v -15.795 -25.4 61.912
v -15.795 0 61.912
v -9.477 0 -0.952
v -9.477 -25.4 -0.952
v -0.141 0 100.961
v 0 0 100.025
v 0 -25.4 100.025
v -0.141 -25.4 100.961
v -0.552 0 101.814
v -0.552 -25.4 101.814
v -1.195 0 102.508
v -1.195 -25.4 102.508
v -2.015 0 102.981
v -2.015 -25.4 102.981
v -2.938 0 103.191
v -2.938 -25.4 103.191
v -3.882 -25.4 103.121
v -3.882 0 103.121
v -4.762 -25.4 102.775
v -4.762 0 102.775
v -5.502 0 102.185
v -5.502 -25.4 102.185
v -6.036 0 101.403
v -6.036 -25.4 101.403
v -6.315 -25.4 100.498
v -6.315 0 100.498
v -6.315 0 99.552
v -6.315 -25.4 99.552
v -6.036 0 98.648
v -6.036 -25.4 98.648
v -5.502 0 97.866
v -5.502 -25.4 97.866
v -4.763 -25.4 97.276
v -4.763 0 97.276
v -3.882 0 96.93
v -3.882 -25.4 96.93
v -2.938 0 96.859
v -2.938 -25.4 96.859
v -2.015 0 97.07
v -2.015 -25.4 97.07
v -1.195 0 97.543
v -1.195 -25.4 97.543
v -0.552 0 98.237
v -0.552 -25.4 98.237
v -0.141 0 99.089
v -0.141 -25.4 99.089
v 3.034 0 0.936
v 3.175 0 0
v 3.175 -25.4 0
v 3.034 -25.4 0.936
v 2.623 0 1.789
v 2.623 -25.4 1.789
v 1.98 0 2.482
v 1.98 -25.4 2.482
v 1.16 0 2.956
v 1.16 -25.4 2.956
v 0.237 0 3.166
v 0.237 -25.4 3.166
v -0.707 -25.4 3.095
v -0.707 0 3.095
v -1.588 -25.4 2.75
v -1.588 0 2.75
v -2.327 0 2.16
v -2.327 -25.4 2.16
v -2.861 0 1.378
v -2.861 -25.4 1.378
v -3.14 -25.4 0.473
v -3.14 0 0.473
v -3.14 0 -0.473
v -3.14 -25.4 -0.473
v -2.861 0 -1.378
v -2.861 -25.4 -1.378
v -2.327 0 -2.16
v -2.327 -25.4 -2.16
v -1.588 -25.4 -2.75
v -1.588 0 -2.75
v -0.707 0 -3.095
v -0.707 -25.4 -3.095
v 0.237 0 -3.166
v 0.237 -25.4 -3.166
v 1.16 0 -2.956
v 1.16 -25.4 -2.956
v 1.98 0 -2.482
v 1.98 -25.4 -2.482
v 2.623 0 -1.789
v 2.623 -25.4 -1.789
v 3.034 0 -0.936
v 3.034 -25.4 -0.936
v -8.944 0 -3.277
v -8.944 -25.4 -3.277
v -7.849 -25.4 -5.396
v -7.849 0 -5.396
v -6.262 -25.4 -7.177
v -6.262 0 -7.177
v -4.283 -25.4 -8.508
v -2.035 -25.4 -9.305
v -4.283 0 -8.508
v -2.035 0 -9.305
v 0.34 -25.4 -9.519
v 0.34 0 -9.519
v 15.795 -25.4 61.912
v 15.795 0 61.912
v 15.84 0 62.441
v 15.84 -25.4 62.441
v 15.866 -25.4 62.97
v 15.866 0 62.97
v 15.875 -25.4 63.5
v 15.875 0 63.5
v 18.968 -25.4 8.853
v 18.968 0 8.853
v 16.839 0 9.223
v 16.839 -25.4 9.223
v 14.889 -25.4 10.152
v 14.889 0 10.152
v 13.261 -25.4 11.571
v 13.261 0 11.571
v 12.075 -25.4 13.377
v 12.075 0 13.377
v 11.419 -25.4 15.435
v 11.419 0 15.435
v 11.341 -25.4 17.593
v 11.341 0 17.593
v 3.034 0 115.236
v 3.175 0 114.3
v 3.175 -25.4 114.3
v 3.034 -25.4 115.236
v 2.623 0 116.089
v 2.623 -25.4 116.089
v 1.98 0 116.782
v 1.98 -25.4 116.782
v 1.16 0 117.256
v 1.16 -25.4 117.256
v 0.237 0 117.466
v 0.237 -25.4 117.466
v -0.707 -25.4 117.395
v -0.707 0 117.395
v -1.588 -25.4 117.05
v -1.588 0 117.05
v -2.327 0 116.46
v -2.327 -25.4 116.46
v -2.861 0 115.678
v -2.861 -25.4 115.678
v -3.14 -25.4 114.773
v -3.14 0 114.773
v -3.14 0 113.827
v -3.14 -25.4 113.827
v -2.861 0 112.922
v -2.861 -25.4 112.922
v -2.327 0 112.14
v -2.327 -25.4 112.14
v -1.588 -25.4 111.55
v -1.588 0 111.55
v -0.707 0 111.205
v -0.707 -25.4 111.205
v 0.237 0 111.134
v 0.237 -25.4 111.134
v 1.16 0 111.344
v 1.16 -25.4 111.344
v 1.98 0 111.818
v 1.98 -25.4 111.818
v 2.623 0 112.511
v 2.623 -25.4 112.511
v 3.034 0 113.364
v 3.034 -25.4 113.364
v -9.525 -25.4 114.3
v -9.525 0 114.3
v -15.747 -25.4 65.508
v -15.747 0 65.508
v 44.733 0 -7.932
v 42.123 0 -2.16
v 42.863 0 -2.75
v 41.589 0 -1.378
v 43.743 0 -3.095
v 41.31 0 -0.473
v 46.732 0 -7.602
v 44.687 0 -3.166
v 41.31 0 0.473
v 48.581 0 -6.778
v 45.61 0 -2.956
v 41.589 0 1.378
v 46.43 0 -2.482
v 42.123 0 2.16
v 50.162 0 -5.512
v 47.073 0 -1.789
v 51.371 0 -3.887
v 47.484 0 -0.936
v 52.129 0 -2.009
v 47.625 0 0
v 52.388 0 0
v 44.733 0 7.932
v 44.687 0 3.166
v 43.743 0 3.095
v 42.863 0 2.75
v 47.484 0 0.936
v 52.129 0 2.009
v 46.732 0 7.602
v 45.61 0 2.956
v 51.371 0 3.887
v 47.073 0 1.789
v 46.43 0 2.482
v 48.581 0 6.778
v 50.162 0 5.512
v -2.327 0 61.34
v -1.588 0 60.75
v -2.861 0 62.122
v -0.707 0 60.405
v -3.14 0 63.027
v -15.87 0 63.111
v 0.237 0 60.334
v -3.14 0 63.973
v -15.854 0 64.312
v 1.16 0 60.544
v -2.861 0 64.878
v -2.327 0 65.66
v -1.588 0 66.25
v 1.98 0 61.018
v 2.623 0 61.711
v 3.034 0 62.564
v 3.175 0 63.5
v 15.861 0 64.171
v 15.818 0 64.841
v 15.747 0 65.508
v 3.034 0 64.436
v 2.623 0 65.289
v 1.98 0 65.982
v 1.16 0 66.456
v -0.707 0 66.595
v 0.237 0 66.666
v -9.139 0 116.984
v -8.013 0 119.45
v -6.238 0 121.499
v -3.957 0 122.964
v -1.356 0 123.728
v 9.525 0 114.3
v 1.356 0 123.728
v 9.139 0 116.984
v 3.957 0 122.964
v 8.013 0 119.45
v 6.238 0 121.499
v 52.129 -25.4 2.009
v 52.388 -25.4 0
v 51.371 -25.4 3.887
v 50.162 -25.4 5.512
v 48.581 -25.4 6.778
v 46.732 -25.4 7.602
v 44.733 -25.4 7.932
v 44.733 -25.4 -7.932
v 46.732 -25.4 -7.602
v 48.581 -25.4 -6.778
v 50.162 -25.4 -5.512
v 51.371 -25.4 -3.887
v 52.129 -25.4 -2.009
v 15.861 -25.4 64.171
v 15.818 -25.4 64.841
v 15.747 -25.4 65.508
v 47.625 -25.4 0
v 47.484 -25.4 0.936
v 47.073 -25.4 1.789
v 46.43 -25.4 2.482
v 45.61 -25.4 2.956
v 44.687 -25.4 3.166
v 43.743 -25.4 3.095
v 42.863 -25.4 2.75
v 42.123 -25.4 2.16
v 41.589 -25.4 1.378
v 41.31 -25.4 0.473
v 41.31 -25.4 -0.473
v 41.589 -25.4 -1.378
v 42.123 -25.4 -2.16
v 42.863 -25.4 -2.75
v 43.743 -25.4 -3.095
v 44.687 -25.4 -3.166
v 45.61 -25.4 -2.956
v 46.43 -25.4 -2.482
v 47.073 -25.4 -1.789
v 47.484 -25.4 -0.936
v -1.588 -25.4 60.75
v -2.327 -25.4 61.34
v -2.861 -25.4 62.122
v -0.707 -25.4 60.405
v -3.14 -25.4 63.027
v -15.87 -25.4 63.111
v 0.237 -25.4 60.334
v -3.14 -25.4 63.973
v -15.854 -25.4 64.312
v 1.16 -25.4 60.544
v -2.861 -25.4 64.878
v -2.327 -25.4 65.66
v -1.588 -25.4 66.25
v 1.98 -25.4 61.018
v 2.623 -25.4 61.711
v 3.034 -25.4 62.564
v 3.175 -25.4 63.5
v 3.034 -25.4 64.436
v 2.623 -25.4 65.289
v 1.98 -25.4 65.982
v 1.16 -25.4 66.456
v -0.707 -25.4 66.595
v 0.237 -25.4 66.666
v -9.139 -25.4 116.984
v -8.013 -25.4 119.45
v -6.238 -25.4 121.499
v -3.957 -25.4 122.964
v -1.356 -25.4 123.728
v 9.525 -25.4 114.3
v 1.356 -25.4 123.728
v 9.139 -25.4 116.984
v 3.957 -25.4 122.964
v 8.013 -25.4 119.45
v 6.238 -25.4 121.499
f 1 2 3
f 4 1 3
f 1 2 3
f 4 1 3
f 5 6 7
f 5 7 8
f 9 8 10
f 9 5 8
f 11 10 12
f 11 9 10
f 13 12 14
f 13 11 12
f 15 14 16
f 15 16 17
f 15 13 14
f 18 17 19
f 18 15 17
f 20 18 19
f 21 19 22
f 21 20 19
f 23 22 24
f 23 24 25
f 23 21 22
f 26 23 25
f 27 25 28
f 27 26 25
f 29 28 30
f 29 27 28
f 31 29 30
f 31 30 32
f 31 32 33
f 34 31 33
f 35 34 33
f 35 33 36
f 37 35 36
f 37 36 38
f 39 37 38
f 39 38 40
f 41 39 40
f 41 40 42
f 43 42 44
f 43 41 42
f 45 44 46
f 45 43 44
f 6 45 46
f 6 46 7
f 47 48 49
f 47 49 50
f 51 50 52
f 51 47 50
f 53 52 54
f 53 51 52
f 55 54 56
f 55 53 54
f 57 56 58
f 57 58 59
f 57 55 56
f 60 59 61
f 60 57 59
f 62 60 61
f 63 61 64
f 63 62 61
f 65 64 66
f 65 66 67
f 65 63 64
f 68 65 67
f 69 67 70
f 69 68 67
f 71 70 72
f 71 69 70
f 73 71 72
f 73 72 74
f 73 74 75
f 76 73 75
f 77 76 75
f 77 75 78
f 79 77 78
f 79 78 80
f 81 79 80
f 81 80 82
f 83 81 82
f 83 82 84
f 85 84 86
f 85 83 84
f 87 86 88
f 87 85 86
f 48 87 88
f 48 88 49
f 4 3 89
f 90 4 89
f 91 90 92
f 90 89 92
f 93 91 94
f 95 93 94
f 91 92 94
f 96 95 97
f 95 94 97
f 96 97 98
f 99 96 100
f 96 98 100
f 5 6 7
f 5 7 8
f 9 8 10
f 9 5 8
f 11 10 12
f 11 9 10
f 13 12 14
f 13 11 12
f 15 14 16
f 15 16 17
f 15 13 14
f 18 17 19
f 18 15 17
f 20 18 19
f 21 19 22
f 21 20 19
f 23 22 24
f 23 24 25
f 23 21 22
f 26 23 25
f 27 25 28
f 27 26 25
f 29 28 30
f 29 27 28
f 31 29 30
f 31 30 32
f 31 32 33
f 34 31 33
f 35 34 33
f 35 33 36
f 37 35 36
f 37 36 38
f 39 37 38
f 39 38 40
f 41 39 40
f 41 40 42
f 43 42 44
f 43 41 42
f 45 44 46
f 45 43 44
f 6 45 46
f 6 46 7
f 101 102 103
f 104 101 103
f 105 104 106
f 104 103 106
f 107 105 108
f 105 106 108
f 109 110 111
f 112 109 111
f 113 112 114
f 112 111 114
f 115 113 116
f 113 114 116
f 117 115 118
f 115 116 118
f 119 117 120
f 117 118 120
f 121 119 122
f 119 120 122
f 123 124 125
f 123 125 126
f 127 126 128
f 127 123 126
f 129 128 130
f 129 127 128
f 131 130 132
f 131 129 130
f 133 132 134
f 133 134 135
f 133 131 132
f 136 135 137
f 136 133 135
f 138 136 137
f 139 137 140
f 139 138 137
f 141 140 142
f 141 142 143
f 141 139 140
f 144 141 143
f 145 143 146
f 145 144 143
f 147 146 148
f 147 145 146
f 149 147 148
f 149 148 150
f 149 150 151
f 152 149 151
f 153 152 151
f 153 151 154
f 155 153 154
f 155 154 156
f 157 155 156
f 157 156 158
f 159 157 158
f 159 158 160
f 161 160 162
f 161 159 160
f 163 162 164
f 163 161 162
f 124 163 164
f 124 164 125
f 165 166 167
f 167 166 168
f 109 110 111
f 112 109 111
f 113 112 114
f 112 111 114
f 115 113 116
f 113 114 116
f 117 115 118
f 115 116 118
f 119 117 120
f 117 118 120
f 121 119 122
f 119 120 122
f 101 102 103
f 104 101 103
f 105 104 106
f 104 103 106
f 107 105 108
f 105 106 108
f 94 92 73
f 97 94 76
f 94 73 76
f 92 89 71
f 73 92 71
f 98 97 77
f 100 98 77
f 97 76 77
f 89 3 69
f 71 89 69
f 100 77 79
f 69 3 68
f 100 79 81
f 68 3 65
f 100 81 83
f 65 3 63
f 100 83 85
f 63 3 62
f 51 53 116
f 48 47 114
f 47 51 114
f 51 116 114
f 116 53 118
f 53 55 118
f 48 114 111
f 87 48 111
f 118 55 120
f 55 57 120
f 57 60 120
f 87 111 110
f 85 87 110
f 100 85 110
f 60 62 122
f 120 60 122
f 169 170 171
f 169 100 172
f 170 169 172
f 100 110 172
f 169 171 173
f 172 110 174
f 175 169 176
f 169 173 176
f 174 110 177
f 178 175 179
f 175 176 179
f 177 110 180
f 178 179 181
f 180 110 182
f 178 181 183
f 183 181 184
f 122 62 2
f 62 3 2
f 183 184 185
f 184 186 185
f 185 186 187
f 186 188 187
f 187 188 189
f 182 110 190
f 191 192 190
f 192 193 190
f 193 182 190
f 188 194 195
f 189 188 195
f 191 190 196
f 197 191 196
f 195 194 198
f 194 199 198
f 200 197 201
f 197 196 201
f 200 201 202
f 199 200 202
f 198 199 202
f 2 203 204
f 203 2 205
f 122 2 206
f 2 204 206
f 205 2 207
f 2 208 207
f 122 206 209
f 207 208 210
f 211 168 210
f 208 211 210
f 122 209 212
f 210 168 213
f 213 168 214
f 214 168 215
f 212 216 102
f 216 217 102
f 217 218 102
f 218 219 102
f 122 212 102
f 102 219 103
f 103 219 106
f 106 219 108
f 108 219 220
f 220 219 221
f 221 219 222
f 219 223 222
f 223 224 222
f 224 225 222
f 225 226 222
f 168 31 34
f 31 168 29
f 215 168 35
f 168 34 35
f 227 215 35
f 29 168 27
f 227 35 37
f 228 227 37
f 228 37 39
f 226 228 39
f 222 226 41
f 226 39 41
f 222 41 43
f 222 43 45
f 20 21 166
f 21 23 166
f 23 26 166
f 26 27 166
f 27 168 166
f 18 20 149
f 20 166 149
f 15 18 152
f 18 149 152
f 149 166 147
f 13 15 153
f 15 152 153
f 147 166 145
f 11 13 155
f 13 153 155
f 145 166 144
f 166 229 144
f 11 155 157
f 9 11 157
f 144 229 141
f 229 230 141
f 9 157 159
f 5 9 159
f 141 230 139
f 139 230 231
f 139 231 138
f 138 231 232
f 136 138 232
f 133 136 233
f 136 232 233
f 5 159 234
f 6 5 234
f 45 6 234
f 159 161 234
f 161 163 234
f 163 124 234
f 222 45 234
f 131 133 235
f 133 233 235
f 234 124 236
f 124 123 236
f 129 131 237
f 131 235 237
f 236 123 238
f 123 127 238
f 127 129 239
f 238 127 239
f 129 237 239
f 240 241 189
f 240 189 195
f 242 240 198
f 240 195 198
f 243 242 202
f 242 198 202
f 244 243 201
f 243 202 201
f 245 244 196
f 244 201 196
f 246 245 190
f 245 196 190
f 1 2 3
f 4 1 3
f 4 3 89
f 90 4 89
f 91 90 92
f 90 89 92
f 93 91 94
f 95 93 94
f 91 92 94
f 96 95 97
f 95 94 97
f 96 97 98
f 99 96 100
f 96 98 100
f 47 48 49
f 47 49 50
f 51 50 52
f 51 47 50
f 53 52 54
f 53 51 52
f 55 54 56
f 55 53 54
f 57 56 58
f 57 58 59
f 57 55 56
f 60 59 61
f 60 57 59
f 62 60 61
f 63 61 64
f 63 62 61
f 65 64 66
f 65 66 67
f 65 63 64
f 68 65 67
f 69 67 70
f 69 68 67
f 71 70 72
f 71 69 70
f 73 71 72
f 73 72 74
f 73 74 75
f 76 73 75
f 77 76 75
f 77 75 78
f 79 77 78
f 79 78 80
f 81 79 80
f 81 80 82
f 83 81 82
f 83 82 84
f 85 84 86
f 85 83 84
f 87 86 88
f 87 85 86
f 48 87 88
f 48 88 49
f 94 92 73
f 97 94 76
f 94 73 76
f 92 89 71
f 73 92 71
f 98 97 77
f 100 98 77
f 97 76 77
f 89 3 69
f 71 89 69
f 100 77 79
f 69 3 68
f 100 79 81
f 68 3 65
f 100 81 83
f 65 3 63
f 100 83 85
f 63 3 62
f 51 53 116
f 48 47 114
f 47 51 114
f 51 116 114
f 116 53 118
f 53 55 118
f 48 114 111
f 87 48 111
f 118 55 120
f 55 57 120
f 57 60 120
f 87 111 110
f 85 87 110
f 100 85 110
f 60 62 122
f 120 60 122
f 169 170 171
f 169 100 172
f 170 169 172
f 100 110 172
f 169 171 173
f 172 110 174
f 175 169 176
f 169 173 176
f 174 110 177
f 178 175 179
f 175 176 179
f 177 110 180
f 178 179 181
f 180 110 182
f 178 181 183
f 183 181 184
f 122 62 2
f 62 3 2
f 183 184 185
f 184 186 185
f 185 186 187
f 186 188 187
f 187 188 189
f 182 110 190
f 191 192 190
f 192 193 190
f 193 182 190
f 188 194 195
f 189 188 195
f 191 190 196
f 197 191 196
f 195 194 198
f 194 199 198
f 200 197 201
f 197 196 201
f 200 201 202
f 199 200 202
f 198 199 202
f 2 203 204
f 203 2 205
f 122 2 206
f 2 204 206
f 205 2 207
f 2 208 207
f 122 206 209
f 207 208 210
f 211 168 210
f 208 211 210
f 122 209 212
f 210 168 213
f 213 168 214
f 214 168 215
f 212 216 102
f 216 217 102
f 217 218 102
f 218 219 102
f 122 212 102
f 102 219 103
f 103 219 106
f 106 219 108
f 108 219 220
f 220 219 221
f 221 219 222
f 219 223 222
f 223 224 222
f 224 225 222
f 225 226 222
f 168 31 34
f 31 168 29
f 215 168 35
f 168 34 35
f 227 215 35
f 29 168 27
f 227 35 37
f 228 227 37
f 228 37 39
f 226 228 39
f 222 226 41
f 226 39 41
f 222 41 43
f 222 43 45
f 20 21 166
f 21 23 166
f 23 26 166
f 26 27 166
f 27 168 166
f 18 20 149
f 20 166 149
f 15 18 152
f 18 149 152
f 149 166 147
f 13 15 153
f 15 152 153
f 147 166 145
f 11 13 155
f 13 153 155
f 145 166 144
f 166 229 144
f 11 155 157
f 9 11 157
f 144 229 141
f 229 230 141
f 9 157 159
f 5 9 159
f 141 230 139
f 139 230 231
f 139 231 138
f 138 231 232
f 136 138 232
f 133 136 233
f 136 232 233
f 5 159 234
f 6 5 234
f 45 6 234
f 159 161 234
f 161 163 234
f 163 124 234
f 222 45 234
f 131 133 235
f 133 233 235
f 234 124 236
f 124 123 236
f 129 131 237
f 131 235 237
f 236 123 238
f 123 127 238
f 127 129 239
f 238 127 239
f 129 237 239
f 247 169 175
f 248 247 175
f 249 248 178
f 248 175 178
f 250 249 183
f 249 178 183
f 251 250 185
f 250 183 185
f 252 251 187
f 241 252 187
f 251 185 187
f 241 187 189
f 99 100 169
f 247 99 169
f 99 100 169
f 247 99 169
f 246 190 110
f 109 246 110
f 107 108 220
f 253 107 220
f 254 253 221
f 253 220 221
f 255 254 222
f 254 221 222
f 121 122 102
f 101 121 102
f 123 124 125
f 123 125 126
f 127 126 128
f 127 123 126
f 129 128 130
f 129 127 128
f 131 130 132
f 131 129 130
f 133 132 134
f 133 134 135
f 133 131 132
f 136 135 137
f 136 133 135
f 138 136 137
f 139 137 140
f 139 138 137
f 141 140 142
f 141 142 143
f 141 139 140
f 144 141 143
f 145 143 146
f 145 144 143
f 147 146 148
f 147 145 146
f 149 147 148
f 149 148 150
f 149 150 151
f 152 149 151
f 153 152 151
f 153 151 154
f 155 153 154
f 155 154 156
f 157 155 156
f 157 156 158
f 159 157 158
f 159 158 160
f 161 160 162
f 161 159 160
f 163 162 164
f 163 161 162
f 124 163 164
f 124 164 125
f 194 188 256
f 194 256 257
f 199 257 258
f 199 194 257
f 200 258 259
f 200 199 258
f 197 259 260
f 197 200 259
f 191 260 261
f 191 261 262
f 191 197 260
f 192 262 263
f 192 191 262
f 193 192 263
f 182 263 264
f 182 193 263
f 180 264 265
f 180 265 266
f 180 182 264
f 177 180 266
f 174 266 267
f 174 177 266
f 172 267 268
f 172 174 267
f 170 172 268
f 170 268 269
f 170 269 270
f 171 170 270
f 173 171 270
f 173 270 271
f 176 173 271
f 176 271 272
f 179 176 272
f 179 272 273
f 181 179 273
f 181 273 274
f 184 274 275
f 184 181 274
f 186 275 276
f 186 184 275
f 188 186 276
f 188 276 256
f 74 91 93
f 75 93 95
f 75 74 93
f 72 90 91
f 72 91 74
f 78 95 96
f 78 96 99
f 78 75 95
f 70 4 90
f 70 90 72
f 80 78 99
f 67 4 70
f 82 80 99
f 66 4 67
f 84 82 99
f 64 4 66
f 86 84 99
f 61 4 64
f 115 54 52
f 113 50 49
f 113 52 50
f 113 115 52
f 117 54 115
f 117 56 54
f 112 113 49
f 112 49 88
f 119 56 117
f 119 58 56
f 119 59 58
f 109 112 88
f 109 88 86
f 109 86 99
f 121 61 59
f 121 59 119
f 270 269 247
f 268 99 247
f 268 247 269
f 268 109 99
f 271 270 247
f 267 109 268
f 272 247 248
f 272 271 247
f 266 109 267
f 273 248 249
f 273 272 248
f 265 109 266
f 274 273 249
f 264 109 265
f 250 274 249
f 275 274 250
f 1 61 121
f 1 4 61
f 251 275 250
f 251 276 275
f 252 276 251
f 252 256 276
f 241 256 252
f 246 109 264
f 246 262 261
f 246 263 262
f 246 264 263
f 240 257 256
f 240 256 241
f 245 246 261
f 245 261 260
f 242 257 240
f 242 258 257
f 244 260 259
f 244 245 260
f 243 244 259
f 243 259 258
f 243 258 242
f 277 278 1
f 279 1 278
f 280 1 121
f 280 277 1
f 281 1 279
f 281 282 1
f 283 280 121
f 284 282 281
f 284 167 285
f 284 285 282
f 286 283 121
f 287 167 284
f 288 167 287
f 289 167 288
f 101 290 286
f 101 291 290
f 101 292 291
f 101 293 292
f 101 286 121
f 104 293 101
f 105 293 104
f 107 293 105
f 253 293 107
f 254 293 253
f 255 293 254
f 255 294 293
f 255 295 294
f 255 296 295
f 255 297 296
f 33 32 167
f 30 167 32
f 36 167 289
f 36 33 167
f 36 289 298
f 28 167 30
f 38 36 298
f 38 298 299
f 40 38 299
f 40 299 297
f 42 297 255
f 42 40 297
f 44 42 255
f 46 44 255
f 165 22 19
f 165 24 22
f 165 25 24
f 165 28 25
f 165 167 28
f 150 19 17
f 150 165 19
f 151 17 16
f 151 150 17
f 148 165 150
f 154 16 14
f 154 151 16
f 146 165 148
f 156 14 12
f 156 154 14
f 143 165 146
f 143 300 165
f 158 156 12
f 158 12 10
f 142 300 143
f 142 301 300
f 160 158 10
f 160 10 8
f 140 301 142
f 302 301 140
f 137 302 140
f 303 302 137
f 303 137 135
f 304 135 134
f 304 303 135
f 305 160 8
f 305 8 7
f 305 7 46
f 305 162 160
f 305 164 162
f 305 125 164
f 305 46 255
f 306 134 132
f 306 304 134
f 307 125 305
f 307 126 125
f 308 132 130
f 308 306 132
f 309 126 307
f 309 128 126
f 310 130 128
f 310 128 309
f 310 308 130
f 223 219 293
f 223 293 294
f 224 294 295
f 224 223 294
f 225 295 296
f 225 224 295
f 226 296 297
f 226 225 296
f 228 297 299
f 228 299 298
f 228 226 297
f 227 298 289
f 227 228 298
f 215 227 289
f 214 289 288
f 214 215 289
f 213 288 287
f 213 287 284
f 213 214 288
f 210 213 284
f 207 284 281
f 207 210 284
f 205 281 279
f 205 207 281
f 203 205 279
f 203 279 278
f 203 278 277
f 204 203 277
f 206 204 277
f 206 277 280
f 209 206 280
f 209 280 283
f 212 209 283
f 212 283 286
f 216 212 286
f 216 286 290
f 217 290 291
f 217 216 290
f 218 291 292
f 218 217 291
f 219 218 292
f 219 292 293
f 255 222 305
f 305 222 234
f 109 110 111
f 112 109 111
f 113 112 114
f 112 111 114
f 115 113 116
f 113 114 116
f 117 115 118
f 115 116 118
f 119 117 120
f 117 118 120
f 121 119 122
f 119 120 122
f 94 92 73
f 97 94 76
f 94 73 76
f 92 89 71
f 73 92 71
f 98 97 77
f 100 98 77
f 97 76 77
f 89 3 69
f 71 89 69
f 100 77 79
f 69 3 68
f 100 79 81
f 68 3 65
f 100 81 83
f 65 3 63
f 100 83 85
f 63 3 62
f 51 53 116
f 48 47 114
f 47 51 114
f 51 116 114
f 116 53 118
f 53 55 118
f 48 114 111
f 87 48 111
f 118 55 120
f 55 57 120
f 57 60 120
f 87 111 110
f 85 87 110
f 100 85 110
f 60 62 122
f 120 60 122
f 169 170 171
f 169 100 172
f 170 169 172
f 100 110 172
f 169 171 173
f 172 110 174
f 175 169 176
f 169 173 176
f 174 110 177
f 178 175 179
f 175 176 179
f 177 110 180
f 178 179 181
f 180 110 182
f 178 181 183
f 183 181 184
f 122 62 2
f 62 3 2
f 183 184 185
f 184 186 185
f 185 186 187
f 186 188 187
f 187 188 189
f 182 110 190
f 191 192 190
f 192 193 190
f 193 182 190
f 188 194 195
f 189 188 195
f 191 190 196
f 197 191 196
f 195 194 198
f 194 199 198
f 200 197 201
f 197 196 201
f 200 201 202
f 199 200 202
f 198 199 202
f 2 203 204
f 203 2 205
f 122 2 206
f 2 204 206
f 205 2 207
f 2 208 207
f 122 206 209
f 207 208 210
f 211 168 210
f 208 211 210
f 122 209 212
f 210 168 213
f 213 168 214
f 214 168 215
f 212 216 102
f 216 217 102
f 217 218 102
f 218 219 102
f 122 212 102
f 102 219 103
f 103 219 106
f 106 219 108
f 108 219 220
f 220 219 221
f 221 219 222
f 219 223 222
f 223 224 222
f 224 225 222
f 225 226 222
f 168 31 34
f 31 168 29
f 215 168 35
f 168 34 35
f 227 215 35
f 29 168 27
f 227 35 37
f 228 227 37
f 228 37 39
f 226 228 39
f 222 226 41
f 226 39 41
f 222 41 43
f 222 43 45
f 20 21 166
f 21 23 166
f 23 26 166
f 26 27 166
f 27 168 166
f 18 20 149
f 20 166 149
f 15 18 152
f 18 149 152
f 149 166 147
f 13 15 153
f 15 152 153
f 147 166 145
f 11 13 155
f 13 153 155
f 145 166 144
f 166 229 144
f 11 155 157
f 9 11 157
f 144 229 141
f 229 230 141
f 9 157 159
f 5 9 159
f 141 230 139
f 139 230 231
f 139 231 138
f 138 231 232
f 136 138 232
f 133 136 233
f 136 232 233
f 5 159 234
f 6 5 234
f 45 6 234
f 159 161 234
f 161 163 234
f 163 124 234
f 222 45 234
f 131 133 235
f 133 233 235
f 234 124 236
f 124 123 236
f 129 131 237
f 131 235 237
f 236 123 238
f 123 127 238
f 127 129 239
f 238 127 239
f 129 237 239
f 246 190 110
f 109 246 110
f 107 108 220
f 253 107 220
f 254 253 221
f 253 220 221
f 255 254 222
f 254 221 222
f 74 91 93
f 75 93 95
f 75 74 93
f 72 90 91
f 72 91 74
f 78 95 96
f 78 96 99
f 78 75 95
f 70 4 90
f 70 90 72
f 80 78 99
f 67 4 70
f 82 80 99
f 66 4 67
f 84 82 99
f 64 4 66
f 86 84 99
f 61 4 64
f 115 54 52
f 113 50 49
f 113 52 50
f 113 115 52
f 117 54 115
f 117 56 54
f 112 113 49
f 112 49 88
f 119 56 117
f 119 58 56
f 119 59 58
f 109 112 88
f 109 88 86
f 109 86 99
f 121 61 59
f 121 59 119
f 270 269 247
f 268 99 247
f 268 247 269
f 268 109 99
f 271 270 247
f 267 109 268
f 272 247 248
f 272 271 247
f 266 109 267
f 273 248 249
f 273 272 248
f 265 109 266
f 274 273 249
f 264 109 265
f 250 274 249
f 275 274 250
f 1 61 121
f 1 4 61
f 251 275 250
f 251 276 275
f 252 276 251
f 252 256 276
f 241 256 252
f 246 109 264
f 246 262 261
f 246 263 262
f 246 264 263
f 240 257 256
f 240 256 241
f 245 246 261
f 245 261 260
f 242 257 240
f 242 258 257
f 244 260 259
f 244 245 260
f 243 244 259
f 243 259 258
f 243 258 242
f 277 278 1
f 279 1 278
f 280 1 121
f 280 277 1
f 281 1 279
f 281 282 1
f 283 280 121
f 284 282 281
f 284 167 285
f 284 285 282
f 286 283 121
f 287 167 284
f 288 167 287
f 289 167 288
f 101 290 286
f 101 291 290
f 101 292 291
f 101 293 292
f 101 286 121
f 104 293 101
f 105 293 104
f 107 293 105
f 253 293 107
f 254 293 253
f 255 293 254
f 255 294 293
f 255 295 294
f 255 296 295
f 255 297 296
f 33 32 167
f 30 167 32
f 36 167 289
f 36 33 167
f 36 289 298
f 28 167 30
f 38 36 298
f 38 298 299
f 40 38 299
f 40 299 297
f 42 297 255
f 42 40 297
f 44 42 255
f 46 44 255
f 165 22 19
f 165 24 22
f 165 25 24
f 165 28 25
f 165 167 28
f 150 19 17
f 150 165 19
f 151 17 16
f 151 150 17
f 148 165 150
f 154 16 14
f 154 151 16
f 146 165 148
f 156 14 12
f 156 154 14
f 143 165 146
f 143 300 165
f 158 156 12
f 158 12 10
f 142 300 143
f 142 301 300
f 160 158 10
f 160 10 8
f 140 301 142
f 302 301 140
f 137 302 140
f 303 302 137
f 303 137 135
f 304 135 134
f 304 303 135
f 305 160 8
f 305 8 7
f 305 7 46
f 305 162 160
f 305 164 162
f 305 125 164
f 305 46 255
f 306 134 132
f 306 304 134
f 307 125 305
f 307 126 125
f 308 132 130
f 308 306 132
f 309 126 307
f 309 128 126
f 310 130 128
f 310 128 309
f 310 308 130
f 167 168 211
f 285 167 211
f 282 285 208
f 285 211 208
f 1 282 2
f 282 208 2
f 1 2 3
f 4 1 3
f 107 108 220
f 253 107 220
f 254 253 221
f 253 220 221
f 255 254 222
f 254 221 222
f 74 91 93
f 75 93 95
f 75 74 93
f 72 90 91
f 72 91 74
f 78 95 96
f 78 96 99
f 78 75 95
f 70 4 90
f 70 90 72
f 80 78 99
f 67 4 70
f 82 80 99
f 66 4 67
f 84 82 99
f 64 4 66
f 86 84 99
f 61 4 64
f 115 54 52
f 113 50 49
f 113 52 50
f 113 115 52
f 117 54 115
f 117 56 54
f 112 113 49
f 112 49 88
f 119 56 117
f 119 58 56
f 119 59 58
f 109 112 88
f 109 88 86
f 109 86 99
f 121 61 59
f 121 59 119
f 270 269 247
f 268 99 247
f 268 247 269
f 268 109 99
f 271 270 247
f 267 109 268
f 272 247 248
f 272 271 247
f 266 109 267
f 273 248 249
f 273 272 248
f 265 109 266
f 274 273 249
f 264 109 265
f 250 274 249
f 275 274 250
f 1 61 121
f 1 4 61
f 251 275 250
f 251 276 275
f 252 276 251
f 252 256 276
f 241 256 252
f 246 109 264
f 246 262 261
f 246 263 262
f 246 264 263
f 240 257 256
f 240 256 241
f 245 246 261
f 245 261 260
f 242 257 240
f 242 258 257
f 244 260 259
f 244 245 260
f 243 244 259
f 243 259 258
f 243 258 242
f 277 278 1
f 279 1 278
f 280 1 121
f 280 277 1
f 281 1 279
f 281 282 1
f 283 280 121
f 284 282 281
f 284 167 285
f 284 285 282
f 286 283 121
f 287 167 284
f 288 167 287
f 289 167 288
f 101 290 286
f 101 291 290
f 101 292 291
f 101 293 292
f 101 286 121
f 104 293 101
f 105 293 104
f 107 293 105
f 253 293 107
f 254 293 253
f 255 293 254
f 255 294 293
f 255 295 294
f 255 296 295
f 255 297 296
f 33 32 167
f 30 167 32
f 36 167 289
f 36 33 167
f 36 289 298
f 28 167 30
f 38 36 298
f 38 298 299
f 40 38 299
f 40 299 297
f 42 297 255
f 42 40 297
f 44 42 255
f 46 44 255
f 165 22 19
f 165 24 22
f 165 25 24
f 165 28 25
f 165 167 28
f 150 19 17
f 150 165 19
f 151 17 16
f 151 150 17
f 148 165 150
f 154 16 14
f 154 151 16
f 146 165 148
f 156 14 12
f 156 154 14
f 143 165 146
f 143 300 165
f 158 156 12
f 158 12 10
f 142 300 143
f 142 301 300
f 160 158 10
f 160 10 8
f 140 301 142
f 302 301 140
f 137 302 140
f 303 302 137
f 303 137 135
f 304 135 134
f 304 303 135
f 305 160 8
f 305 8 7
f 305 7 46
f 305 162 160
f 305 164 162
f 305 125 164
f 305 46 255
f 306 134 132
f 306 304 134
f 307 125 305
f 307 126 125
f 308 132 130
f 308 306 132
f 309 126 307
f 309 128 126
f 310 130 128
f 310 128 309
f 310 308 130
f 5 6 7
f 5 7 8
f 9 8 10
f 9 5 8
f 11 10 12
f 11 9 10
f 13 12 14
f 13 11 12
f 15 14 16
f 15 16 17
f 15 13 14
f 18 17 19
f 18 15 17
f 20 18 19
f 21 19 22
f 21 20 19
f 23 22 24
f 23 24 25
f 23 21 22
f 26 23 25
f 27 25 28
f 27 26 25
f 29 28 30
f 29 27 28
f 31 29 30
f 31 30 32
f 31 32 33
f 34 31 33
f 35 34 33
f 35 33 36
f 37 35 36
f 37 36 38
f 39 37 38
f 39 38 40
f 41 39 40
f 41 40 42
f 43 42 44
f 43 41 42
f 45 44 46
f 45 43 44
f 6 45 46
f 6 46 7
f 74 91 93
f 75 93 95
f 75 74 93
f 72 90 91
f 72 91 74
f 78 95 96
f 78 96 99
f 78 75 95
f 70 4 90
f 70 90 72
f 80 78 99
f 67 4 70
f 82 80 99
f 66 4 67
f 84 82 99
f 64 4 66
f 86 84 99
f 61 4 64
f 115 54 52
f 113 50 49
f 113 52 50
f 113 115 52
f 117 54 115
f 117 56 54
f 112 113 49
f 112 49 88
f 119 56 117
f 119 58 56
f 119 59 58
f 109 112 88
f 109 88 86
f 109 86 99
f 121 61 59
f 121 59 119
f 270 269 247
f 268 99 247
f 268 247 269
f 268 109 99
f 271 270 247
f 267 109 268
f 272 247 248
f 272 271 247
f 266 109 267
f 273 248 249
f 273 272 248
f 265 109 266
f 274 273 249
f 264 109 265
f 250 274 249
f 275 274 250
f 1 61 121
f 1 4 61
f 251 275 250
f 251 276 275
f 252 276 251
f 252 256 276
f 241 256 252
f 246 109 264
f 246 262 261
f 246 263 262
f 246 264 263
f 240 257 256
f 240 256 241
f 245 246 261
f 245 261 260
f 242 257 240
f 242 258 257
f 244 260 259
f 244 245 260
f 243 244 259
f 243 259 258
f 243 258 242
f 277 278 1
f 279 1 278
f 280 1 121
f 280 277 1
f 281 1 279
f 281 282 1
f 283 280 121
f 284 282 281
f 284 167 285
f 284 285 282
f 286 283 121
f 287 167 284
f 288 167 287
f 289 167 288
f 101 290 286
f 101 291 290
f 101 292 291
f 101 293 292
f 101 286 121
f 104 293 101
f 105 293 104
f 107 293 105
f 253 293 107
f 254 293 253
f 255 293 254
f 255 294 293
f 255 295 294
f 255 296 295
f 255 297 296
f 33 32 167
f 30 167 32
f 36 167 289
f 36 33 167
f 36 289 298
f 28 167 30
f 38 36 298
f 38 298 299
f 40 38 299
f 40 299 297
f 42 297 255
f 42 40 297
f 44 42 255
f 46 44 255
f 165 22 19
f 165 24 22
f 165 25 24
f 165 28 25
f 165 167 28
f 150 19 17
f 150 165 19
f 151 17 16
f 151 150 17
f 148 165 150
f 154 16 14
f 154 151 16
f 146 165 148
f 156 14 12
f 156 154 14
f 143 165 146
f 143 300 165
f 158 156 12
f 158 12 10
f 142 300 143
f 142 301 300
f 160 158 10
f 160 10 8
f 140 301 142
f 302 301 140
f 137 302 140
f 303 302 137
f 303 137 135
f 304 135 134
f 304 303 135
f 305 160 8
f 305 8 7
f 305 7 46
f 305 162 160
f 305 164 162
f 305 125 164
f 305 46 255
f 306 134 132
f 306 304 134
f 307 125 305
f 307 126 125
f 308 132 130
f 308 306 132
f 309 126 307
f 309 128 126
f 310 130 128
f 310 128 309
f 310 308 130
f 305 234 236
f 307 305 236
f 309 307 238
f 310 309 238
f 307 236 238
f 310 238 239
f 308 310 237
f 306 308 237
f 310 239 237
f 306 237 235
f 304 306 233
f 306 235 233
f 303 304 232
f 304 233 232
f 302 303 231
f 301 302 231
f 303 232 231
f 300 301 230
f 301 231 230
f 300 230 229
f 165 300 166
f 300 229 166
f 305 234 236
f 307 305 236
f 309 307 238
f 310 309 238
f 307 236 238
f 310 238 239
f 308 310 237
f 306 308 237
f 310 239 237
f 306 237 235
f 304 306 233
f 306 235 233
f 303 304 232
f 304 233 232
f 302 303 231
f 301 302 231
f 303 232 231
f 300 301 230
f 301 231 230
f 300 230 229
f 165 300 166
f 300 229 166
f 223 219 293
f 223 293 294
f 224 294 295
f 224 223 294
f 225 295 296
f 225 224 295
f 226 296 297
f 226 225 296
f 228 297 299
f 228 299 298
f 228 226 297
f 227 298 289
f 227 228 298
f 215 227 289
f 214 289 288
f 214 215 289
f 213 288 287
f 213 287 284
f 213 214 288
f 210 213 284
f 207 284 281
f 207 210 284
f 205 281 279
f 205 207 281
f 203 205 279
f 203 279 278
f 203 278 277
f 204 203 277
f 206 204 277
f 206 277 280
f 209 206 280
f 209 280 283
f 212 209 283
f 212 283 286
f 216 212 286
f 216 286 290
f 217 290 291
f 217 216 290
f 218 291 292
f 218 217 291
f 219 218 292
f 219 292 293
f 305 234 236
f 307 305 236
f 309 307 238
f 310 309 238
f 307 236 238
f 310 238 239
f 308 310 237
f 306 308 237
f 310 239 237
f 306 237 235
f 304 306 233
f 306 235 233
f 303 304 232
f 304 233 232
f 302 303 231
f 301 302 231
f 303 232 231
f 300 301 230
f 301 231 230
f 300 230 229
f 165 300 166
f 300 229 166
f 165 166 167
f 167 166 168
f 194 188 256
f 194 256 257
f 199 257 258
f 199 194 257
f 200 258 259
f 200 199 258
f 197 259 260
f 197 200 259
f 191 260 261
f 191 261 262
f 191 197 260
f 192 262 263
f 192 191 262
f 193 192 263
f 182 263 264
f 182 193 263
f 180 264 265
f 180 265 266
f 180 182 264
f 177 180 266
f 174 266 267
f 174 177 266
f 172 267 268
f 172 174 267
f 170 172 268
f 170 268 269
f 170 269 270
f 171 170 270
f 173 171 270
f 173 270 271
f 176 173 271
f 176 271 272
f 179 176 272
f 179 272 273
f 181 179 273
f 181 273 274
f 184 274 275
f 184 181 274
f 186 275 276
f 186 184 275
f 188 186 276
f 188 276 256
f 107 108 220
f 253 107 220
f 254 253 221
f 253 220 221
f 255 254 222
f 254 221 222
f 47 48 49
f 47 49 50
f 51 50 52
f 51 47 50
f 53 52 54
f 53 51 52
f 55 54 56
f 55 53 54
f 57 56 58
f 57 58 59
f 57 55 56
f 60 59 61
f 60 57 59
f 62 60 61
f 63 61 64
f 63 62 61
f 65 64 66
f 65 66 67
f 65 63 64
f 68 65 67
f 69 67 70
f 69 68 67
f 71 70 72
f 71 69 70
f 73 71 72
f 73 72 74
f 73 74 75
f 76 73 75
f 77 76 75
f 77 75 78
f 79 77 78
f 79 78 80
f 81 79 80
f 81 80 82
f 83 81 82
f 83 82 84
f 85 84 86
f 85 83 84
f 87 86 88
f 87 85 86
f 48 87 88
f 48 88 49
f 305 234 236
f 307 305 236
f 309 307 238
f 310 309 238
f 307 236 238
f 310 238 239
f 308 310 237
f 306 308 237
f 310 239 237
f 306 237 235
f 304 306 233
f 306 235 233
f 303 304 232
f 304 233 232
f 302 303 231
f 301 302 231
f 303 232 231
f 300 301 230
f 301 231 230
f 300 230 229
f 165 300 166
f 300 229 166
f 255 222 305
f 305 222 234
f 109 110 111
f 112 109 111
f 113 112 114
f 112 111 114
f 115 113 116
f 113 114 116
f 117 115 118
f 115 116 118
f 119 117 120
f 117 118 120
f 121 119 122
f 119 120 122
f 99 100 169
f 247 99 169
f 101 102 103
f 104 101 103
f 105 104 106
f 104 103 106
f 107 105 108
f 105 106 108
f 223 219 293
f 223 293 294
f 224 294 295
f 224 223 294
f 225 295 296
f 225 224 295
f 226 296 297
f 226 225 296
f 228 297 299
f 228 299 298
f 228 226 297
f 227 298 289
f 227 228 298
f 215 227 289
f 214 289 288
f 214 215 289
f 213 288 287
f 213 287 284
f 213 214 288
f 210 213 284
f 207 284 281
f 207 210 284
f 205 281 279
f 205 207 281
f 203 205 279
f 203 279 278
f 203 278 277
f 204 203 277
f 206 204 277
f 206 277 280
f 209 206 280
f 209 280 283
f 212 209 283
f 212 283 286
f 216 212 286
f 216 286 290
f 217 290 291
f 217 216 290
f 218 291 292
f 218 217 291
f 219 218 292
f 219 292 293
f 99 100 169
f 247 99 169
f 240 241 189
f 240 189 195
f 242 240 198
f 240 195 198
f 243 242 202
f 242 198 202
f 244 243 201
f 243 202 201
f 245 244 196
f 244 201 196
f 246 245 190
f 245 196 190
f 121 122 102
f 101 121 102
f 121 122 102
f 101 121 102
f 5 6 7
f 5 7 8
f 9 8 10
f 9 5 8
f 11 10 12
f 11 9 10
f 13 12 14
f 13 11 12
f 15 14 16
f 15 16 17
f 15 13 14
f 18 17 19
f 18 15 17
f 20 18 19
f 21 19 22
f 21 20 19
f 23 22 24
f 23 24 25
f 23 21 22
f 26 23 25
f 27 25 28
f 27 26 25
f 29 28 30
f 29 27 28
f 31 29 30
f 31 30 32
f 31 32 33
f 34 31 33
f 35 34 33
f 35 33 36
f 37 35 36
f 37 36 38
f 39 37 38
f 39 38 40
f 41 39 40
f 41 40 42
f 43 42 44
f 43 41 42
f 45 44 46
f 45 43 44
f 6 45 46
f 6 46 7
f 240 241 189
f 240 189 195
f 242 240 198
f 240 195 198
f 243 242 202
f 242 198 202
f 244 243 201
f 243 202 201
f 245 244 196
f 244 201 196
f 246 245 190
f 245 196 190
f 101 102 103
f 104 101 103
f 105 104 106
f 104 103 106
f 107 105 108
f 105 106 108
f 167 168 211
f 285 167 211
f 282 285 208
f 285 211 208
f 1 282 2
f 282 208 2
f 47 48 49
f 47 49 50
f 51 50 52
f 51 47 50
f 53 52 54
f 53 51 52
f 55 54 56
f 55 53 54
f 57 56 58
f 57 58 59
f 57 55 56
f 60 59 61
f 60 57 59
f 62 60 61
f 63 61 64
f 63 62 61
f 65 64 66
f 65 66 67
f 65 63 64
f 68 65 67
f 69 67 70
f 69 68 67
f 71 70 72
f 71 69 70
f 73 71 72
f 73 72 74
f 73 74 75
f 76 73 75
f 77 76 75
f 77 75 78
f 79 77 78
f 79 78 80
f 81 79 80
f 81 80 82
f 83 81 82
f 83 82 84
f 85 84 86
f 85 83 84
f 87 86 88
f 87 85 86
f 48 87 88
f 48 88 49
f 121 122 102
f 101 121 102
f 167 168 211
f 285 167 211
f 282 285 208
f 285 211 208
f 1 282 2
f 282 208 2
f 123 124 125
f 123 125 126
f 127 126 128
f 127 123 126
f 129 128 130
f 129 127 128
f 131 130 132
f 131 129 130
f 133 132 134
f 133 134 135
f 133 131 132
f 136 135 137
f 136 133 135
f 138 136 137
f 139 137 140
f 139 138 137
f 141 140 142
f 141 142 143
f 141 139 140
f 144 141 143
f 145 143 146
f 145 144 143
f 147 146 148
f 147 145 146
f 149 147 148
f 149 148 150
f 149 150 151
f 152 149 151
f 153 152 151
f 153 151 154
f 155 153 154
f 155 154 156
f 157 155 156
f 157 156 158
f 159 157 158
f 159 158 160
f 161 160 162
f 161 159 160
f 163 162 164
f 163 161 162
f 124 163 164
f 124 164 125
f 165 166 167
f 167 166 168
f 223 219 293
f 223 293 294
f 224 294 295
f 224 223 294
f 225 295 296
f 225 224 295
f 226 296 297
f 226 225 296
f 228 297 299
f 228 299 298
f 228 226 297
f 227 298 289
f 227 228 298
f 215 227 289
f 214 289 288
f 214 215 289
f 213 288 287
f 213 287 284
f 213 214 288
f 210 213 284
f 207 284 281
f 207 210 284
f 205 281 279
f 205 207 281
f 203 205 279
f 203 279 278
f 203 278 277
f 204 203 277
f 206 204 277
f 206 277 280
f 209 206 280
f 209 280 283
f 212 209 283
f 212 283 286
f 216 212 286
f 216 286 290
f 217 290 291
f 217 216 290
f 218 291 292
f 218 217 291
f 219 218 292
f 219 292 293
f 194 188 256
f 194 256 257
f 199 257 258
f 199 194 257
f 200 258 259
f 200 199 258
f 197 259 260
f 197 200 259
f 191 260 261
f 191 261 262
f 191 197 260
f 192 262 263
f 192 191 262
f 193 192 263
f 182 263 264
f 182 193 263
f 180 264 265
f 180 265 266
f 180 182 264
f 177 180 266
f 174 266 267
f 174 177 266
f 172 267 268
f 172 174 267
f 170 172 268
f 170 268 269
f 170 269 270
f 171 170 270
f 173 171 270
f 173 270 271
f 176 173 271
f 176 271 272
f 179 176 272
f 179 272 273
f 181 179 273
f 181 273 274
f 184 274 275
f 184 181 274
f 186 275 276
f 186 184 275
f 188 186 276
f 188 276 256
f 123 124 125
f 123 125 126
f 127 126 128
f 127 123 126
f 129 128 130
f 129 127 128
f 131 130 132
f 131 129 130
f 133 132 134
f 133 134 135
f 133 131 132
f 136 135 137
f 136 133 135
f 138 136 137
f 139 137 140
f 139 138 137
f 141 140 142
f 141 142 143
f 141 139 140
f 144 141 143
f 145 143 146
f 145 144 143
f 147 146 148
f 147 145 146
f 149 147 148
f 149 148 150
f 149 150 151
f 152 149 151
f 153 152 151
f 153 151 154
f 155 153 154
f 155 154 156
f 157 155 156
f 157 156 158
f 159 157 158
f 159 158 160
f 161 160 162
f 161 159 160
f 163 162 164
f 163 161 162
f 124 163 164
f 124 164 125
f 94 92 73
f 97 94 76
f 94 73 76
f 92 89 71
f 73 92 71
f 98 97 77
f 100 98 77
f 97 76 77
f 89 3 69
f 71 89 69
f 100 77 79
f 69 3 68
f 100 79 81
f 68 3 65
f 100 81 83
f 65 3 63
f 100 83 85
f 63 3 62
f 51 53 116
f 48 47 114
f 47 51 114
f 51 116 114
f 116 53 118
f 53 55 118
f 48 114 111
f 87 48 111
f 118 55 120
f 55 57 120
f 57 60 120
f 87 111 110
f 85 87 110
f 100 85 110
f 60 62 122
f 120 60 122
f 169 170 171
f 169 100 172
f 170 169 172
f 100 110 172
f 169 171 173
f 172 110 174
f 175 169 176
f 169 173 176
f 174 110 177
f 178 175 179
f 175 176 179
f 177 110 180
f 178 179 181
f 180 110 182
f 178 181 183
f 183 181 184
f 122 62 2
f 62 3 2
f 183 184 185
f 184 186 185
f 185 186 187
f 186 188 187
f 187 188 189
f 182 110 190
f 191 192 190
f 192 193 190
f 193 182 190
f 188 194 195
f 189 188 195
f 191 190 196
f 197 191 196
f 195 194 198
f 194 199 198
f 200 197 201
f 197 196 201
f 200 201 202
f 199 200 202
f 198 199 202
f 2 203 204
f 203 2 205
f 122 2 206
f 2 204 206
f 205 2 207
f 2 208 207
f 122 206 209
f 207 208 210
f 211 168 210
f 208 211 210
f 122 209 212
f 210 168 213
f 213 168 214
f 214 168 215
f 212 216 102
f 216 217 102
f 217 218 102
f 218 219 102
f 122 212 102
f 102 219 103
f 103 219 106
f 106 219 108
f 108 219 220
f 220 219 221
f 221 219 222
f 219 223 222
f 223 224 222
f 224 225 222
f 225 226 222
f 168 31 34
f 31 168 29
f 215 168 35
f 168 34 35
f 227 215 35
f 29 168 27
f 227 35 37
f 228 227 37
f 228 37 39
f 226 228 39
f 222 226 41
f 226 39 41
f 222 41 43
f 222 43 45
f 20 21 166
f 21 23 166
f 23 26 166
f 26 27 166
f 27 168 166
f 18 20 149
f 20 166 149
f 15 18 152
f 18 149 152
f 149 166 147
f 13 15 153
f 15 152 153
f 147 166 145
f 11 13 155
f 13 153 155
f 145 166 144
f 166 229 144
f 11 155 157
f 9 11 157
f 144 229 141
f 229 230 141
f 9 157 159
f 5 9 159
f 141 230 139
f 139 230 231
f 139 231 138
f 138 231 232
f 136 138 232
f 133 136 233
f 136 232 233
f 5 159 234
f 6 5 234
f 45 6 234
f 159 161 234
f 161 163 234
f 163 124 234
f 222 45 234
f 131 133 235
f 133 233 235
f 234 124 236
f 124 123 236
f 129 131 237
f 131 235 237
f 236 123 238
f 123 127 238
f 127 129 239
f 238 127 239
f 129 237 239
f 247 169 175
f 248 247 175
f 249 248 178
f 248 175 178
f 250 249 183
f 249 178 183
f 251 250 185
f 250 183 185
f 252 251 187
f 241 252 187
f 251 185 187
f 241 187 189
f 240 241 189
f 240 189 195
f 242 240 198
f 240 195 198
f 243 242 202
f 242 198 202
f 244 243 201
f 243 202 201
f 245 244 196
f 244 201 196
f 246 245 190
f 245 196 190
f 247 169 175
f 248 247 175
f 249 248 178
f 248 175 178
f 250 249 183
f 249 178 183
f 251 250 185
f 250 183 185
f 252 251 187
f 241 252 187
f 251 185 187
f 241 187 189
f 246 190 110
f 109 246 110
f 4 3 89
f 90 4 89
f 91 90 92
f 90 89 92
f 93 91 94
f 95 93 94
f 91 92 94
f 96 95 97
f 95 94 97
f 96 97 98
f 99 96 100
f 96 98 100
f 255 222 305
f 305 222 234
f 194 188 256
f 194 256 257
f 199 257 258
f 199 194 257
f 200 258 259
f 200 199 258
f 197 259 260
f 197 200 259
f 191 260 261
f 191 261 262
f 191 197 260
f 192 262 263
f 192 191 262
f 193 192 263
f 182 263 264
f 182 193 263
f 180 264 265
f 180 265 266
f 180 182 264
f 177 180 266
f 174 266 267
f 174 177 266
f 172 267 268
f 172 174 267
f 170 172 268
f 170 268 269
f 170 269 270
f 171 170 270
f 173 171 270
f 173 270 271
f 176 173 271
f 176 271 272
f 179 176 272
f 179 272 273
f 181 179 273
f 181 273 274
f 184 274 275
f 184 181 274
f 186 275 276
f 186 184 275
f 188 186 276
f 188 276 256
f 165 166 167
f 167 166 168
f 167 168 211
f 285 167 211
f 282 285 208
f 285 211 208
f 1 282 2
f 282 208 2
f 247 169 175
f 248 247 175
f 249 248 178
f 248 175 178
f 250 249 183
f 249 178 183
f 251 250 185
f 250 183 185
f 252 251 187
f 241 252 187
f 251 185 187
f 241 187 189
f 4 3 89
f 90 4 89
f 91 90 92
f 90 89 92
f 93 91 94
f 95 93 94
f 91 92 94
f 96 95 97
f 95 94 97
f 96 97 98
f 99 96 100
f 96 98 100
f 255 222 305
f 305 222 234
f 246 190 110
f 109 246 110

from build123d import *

# Parameters (mm, degrees)
F0_R     = 3.175
F1_DEPTH = 25.4
F2_DEPTH = 25.4
F3_DEPTH = 25.4
F4_DEPTH = 25.4


with BuildPart() as f1:
    # F0 (on Front) → F1 (new body)
    with BuildSketch(Plane.XZ):
        with BuildLine():
            ThreePointArc((0.340179, -9.518923), (6.854408, -6.613827), (9.525, 0))
            ThreePointArc((9.525, 0), (-0.476848, 9.513056), (-9.477255, -0.9525))
            ThreePointArc((-9.477255, -0.9525), (-6.262383, -7.17692), (0.340179, -9.518923))
        make_face()
        Circle(F0_R, mode=Mode.SUBTRACT)
        with BuildLine():
            ThreePointArc((-9.477255, -0.9525), (-0.476848, 9.513056), (9.525, 0))
            ThreePointArc((9.525, 0), (6.854408, -6.613827), (0.340179, -9.518923))
            Line((0.340179, -9.518923), (44.733482, -7.932436))
            ThreePointArc((44.733482, -7.932436), (36.5125, 0), (44.733482, 7.932436))
            Line((44.733482, 7.932436), (18.9676, 8.853234))
            ThreePointArc((18.9676, 8.853234), (13.2612, 11.571359), (11.341187, 17.593382))
            Line((11.341187, 17.593382), (15.795426, 61.9125))
            ThreePointArc((15.795426, 61.9125), (0, 47.625), (-15.795426, 61.9125))
            Line((-15.795426, 61.9125), (-9.477255, -0.9525))
        make_face()
        with BuildLine():
            ThreePointArc((-15.747457, 65.508289), (-15.873588, 63.711757), (-15.795426, 61.9125))
            ThreePointArc((-15.795426, 61.9125), (0, 47.625), (15.795426, 61.9125))
            ThreePointArc((15.795426, 61.9125), (15.855094, 62.705253), (15.875, 63.5))
            ThreePointArc((15.875, 63.5), (15.843082, 64.506168), (15.747457, 65.508289))
            ThreePointArc((15.747457, 65.508289), (0, 79.375), (-15.747457, 65.508289))
        make_face()
        with Locations((0, 63.5)):
            Circle(F0_R, mode=Mode.SUBTRACT)
        with BuildLine():
            ThreePointArc((44.733482, 7.932436), (36.5125, 0), (44.733482, -7.932436))
            ThreePointArc((44.733482, -7.932436), (50.162007, -5.511523), (52.3875, 0))
            ThreePointArc((52.3875, 0), (50.162007, 5.511523), (44.733482, 7.932436))
        make_face()
        with Locations((44.45, 0)):
            Circle(F0_R, mode=Mode.SUBTRACT)
        with BuildLine():
            Line((-9.525, 114.3), (-15.747457, 65.508289))
            ThreePointArc((-15.747457, 65.508289), (0, 79.375), (15.747457, 65.508289))
            Line((15.747457, 65.508289), (9.525, 114.3))
            ThreePointArc((9.525, 114.3), (0, 104.775), (-9.525, 114.3))
        make_face()
        with Locations((-3.175, 100.0252)):
            Circle(F0_R, mode=Mode.SUBTRACT)
        with BuildLine():
            ThreePointArc((9.525, 114.3), (0, 123.825), (-9.525, 114.3))
            ThreePointArc((-9.525, 114.3), (0, 104.775), (9.525, 114.3))
        make_face()
        with Locations((0, 114.3)):
            Circle(F0_R, mode=Mode.SUBTRACT)
    extrude(amount=F1_DEPTH)


with BuildPart() as f2:
    # F0 (on Front) → F2 (new body)
    with BuildSketch(Plane.XZ):
        with BuildLine():
            ThreePointArc((0.340179, -9.518923), (6.854408, -6.613827), (9.525, 0))
            ThreePointArc((9.525, 0), (-0.476848, 9.513056), (-9.477255, -0.9525))
            ThreePointArc((-9.477255, -0.9525), (-6.262383, -7.17692), (0.340179, -9.518923))
        make_face()
        Circle(F0_R, mode=Mode.SUBTRACT)
        with BuildLine():
            ThreePointArc((-9.477255, -0.9525), (-0.476848, 9.513056), (9.525, 0))
            ThreePointArc((9.525, 0), (6.854408, -6.613827), (0.340179, -9.518923))
            Line((0.340179, -9.518923), (44.733482, -7.932436))
            ThreePointArc((44.733482, -7.932436), (36.5125, 0), (44.733482, 7.932436))
            Line((44.733482, 7.932436), (18.9676, 8.853234))
            ThreePointArc((18.9676, 8.853234), (13.2612, 11.571359), (11.341187, 17.593382))
            Line((11.341187, 17.593382), (15.795426, 61.9125))
            ThreePointArc((15.795426, 61.9125), (0, 47.625), (-15.795426, 61.9125))
            Line((-15.795426, 61.9125), (-9.477255, -0.9525))
        make_face()
        with BuildLine():
            ThreePointArc((-15.747457, 65.508289), (-15.873588, 63.711757), (-15.795426, 61.9125))
            ThreePointArc((-15.795426, 61.9125), (0, 47.625), (15.795426, 61.9125))
            ThreePointArc((15.795426, 61.9125), (15.855094, 62.705253), (15.875, 63.5))
            ThreePointArc((15.875, 63.5), (15.843082, 64.506168), (15.747457, 65.508289))
            ThreePointArc((15.747457, 65.508289), (0, 79.375), (-15.747457, 65.508289))
        make_face()
        with Locations((0, 63.5)):
            Circle(F0_R, mode=Mode.SUBTRACT)
        with BuildLine():
            ThreePointArc((44.733482, 7.932436), (36.5125, 0), (44.733482, -7.932436))
            ThreePointArc((44.733482, -7.932436), (50.162007, -5.511523), (52.3875, 0))
            ThreePointArc((52.3875, 0), (50.162007, 5.511523), (44.733482, 7.932436))
        make_face()
        with Locations((44.45, 0)):
            Circle(F0_R, mode=Mode.SUBTRACT)
        with BuildLine():
            Line((-9.525, 114.3), (-15.747457, 65.508289))
            ThreePointArc((-15.747457, 65.508289), (0, 79.375), (15.747457, 65.508289))
            Line((15.747457, 65.508289), (9.525, 114.3))
            ThreePointArc((9.525, 114.3), (0, 104.775), (-9.525, 114.3))
        make_face()
        with Locations((-3.175, 100.0252)):
            Circle(F0_R, mode=Mode.SUBTRACT)
        with BuildLine():
            ThreePointArc((9.525, 114.3), (0, 123.825), (-9.525, 114.3))
            ThreePointArc((-9.525, 114.3), (0, 104.775), (9.525, 114.3))
        make_face()
        with Locations((0, 114.3)):
            Circle(F0_R, mode=Mode.SUBTRACT)
    extrude(amount=F2_DEPTH)


with BuildPart() as f3:
    # F0 (on Front) → F3 (new body)
    with BuildSketch(Plane.XZ):
        with BuildLine():
            ThreePointArc((0.340179, -9.518923), (6.854408, -6.613827), (9.525, 0))
            ThreePointArc((9.525, 0), (-0.476848, 9.513056), (-9.477255, -0.9525))
            ThreePointArc((-9.477255, -0.9525), (-6.262383, -7.17692), (0.340179, -9.518923))
        make_face()
        Circle(F0_R, mode=Mode.SUBTRACT)
        with BuildLine():
            ThreePointArc((-9.477255, -0.9525), (-0.476848, 9.513056), (9.525, 0))
            ThreePointArc((9.525, 0), (6.854408, -6.613827), (0.340179, -9.518923))
            Line((0.340179, -9.518923), (44.733482, -7.932436))
            ThreePointArc((44.733482, -7.932436), (36.5125, 0), (44.733482, 7.932436))
            Line((44.733482, 7.932436), (18.9676, 8.853234))
            ThreePointArc((18.9676, 8.853234), (13.2612, 11.571359), (11.341187, 17.593382))
            Line((11.341187, 17.593382), (15.795426, 61.9125))
            ThreePointArc((15.795426, 61.9125), (0, 47.625), (-15.795426, 61.9125))
            Line((-15.795426, 61.9125), (-9.477255, -0.9525))
        make_face()
        with BuildLine():
            ThreePointArc((-15.747457, 65.508289), (-15.873588, 63.711757), (-15.795426, 61.9125))
            ThreePointArc((-15.795426, 61.9125), (0, 47.625), (15.795426, 61.9125))
            ThreePointArc((15.795426, 61.9125), (15.855094, 62.705253), (15.875, 63.5))
            ThreePointArc((15.875, 63.5), (15.843082, 64.506168), (15.747457, 65.508289))
            ThreePointArc((15.747457, 65.508289), (0, 79.375), (-15.747457, 65.508289))
        make_face()
        with Locations((0, 63.5)):
            Circle(F0_R, mode=Mode.SUBTRACT)
        with BuildLine():
            ThreePointArc((44.733482, 7.932436), (36.5125, 0), (44.733482, -7.932436))
            ThreePointArc((44.733482, -7.932436), (50.162007, -5.511523), (52.3875, 0))
            ThreePointArc((52.3875, 0), (50.162007, 5.511523), (44.733482, 7.932436))
        make_face()
        with Locations((44.45, 0)):
            Circle(F0_R, mode=Mode.SUBTRACT)
        with BuildLine():
            Line((-9.525, 114.3), (-15.747457, 65.508289))
            ThreePointArc((-15.747457, 65.508289), (0, 79.375), (15.747457, 65.508289))
            Line((15.747457, 65.508289), (9.525, 114.3))
            ThreePointArc((9.525, 114.3), (0, 104.775), (-9.525, 114.3))
        make_face()
        with Locations((-3.175, 100.0252)):
            Circle(F0_R, mode=Mode.SUBTRACT)
        with BuildLine():
            ThreePointArc((9.525, 114.3), (0, 123.825), (-9.525, 114.3))
            ThreePointArc((-9.525, 114.3), (0, 104.775), (9.525, 114.3))
        make_face()
        with Locations((0, 114.3)):
            Circle(F0_R, mode=Mode.SUBTRACT)
    extrude(amount=F3_DEPTH)


with BuildPart() as f4:
    # F0 (on Front) → F4 (new body)
    with BuildSketch(Plane.XZ):
        with BuildLine():
            ThreePointArc((0.340179, -9.518923), (6.854408, -6.613827), (9.525, 0))
            ThreePointArc((9.525, 0), (-0.476848, 9.513056), (-9.477255, -0.9525))
            ThreePointArc((-9.477255, -0.9525), (-6.262383, -7.17692), (0.340179, -9.518923))
        make_face()
        Circle(F0_R, mode=Mode.SUBTRACT)
        with BuildLine():
            ThreePointArc((-9.477255, -0.9525), (-0.476848, 9.513056), (9.525, 0))
            ThreePointArc((9.525, 0), (6.854408, -6.613827), (0.340179, -9.518923))
            Line((0.340179, -9.518923), (44.733482, -7.932436))
            ThreePointArc((44.733482, -7.932436), (36.5125, 0), (44.733482, 7.932436))
            Line((44.733482, 7.932436), (18.9676, 8.853234))
            ThreePointArc((18.9676, 8.853234), (13.2612, 11.571359), (11.341187, 17.593382))
            Line((11.341187, 17.593382), (15.795426, 61.9125))
            ThreePointArc((15.795426, 61.9125), (0, 47.625), (-15.795426, 61.9125))
            Line((-15.795426, 61.9125), (-9.477255, -0.9525))
        make_face()
        with BuildLine():
            ThreePointArc((-15.747457, 65.508289), (-15.873588, 63.711757), (-15.795426, 61.9125))
            ThreePointArc((-15.795426, 61.9125), (0, 47.625), (15.795426, 61.9125))
            ThreePointArc((15.795426, 61.9125), (15.855094, 62.705253), (15.875, 63.5))
            ThreePointArc((15.875, 63.5), (15.843082, 64.506168), (15.747457, 65.508289))
            ThreePointArc((15.747457, 65.508289), (0, 79.375), (-15.747457, 65.508289))
        make_face()
        with Locations((0, 63.5)):
            Circle(F0_R, mode=Mode.SUBTRACT)
        with BuildLine():
            ThreePointArc((44.733482, 7.932436), (36.5125, 0), (44.733482, -7.932436))
            ThreePointArc((44.733482, -7.932436), (50.162007, -5.511523), (52.3875, 0))
            ThreePointArc((52.3875, 0), (50.162007, 5.511523), (44.733482, 7.932436))
        make_face()
        with Locations((44.45, 0)):
            Circle(F0_R, mode=Mode.SUBTRACT)
        with BuildLine():
            Line((-9.525, 114.3), (-15.747457, 65.508289))
            ThreePointArc((-15.747457, 65.508289), (0, 79.375), (15.747457, 65.508289))
            Line((15.747457, 65.508289), (9.525, 114.3))
            ThreePointArc((9.525, 114.3), (0, 104.775), (-9.525, 114.3))
        make_face()
        with Locations((-3.175, 100.0252)):
            Circle(F0_R, mode=Mode.SUBTRACT)
        with BuildLine():
            ThreePointArc((9.525, 114.3), (0, 123.825), (-9.525, 114.3))
            ThreePointArc((-9.525, 114.3), (0, 104.775), (9.525, 114.3))
        make_face()
        with Locations((0, 114.3)):
            Circle(F0_R, mode=Mode.SUBTRACT)
    extrude(amount=F4_DEPTH)


solid = Compound([f1.part, f2.part, f3.part, f4.part])
